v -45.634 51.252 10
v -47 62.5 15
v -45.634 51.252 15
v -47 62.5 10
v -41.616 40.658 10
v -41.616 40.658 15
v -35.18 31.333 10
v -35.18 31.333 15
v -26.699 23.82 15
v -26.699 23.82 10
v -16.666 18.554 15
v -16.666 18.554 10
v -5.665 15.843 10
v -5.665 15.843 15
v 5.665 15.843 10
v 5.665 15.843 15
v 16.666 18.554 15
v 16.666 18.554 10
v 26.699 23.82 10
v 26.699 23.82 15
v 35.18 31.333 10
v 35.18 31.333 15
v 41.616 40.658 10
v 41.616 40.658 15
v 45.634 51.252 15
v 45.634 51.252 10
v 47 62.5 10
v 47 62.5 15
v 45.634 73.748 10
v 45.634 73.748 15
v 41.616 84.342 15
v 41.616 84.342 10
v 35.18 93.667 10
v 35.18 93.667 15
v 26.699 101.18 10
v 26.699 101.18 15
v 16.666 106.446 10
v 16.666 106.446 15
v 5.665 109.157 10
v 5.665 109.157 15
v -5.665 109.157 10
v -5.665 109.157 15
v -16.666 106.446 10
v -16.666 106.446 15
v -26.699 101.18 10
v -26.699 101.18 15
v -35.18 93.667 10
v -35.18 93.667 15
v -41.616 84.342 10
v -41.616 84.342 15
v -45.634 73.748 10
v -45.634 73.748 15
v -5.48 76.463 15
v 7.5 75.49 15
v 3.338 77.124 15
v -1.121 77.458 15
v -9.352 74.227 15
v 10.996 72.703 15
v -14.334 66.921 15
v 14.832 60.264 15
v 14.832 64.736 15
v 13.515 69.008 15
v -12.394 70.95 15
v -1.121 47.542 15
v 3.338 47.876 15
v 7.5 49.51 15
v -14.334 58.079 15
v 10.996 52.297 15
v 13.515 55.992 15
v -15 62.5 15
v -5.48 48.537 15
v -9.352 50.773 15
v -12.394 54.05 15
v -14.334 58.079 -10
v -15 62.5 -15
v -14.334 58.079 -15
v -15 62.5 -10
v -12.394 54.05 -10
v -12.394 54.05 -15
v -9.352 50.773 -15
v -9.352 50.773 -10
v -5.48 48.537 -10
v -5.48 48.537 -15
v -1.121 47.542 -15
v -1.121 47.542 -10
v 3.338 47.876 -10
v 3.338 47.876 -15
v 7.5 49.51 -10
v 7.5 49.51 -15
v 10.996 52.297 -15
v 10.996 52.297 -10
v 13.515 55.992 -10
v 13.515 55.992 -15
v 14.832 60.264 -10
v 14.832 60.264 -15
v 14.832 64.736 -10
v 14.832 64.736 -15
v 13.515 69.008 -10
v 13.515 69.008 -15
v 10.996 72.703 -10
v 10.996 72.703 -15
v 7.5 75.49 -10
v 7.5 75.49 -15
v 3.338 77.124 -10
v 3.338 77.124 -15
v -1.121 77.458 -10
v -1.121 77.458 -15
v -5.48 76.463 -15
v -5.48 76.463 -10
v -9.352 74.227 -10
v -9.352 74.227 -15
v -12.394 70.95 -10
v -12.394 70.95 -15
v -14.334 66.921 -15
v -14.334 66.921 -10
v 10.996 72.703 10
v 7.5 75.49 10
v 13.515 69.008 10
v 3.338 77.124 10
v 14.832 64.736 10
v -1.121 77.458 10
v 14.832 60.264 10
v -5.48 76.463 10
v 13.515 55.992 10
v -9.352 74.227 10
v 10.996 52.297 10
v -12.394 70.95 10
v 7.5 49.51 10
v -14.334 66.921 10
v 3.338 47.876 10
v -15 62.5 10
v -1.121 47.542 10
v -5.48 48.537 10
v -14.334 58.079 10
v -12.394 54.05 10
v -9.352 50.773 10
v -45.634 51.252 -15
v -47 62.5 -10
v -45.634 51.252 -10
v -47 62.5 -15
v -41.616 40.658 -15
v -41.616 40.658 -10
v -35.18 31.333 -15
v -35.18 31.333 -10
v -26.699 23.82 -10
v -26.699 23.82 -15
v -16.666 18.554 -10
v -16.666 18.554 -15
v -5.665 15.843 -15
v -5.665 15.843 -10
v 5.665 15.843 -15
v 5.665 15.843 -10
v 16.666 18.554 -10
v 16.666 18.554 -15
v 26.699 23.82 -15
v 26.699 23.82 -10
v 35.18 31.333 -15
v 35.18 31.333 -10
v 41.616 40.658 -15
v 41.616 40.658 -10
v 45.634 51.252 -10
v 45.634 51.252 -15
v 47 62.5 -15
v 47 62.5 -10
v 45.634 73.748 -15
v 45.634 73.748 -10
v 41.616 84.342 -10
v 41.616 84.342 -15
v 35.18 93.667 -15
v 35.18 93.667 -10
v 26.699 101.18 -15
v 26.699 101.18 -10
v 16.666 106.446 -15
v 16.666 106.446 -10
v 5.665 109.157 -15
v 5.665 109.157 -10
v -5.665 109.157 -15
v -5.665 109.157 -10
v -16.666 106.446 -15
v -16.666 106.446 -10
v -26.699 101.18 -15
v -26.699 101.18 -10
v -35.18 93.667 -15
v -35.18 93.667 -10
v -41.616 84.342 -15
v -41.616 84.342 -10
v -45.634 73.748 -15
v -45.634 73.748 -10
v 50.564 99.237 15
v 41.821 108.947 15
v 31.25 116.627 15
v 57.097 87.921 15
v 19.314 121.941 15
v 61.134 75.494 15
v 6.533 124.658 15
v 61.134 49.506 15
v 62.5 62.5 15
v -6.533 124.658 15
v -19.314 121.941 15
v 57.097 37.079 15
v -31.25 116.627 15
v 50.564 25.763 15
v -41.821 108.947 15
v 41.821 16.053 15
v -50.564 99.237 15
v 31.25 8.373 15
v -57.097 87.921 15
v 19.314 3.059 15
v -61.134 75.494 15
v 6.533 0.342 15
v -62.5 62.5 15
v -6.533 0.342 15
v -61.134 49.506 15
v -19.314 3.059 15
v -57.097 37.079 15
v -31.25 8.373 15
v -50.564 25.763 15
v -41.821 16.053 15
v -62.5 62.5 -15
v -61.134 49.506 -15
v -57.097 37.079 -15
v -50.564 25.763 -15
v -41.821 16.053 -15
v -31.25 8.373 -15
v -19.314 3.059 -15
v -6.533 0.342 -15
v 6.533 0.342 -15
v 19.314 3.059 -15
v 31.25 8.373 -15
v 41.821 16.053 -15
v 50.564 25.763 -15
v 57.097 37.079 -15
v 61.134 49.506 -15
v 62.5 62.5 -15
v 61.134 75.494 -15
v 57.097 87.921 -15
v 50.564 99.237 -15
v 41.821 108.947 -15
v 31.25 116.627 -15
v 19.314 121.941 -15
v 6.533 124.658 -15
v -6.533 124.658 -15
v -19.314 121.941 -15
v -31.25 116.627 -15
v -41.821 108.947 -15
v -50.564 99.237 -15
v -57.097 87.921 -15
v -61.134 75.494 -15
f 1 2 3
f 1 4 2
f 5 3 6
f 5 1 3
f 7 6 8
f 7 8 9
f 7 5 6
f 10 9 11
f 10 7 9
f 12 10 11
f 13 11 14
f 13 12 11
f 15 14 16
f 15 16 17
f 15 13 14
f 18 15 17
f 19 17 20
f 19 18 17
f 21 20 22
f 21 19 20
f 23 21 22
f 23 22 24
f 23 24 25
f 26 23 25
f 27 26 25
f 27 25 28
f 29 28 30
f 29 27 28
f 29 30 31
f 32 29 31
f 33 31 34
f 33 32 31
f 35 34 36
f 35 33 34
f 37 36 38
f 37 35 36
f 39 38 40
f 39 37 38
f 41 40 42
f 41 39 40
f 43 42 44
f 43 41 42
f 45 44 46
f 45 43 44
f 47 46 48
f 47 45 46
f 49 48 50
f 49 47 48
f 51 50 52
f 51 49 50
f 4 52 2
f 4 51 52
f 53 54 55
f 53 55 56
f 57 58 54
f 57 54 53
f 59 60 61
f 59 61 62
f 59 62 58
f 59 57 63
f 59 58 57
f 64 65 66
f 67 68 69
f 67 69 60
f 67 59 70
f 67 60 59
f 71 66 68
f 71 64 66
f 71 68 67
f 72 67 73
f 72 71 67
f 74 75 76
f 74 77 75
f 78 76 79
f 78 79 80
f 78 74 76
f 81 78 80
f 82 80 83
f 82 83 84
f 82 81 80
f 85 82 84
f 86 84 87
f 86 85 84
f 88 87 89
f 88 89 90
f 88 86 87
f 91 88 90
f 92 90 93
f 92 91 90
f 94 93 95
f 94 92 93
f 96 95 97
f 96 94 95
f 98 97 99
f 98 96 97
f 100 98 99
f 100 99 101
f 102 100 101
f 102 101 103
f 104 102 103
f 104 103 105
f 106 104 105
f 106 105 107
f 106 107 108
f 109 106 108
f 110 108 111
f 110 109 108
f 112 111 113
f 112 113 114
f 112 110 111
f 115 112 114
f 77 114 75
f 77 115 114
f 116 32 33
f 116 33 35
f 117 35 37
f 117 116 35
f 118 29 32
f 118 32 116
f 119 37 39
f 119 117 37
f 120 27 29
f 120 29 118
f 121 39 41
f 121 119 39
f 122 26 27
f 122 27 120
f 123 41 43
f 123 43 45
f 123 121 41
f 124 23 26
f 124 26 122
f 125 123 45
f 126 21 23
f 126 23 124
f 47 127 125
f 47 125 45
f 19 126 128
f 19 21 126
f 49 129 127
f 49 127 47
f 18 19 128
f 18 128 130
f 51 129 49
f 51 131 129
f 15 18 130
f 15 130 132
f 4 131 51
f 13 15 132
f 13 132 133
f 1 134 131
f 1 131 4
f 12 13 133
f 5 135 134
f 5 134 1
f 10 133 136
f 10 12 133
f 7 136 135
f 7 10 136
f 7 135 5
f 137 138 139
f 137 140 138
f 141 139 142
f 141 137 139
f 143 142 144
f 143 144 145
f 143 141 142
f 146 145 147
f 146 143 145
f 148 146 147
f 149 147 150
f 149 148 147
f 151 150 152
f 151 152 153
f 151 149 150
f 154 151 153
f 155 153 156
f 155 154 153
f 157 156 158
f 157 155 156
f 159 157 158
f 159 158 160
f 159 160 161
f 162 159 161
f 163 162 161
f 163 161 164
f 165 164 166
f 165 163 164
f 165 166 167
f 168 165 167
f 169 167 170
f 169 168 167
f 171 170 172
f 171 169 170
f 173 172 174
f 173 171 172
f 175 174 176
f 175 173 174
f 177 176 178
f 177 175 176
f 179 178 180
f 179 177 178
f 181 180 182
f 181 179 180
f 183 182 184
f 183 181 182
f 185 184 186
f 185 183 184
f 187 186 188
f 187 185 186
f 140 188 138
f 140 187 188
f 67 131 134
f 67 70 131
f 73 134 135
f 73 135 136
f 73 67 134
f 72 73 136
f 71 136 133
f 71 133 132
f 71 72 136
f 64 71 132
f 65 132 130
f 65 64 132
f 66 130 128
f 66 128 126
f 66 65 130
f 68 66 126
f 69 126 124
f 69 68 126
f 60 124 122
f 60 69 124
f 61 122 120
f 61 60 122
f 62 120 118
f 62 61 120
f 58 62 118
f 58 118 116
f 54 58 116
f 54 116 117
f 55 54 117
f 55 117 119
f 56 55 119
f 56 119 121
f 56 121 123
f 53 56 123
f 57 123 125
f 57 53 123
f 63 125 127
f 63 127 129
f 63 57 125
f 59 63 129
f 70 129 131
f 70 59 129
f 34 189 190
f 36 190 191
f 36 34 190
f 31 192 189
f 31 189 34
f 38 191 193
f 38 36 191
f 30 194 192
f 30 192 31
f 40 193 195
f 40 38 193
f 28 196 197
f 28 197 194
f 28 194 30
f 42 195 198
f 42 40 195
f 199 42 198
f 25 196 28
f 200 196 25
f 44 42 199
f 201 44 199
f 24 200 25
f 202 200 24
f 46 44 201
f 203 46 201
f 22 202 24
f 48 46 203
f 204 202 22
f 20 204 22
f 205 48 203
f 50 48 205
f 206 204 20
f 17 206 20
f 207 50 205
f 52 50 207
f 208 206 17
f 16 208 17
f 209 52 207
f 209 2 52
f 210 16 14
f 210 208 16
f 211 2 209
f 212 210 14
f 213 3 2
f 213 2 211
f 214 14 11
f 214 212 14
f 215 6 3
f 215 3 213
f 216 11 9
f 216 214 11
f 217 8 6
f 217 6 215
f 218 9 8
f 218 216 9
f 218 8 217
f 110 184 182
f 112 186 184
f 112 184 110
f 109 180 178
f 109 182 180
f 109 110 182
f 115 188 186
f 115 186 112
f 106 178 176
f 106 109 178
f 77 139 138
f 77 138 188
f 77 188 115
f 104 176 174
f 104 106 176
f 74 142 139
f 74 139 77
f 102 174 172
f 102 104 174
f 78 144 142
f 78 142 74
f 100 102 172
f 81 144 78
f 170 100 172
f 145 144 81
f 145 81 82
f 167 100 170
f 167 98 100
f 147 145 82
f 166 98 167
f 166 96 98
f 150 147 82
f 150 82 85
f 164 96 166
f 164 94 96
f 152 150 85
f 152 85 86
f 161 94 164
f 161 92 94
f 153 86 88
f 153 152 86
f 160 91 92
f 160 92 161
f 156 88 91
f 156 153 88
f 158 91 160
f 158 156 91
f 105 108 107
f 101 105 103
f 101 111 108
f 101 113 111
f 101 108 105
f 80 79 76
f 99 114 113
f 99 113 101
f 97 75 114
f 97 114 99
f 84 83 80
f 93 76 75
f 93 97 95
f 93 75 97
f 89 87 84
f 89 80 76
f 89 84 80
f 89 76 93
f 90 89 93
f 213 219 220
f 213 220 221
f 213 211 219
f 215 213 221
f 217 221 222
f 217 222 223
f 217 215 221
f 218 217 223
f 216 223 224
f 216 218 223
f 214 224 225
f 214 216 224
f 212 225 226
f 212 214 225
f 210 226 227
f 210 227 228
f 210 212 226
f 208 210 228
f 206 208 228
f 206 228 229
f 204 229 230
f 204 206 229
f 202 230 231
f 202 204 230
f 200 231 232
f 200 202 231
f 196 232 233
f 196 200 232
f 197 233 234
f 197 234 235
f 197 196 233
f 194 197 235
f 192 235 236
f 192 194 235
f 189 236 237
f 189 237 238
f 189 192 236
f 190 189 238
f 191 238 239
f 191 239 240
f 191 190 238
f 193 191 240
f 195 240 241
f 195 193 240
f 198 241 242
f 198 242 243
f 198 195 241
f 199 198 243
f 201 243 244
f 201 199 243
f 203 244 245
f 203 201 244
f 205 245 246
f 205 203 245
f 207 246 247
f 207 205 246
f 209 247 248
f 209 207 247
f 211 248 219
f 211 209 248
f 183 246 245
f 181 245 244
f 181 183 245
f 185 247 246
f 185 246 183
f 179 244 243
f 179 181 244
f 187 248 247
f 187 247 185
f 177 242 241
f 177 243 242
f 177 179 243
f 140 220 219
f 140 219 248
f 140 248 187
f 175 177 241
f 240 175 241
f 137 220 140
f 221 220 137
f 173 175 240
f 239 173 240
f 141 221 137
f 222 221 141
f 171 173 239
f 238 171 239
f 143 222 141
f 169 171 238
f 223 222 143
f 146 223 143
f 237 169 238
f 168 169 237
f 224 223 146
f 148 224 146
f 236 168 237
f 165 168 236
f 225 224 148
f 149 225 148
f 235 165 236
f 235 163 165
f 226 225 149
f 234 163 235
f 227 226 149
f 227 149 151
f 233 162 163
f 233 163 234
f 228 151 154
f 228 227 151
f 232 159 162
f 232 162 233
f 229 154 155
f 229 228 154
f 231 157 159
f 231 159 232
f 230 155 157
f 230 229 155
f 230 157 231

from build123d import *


with BuildPart() as part:
    # SK_P01_Wheel125x30 → P01_Wheel125x30 (revolve)
    with BuildSketch(Plane(origin=(0, 62.5, 0), x_dir=(1, 0, 0), z_dir=(0, 1, 0)), mode=Mode.PRIVATE) as p01_wheel125x30_sk:
        Polygon((0, 15), (15, 15), (15, 10), (47, 10), (47, 15), (62.5, 15), (62.5, -15), (47, -15), (47, -10), (15, -10), (15, -15), (0, -15), align=None)
    revolve(p01_wheel125x30_sk.sketch.rotate(Axis((0, 62.5, -20), (0, 0, 1)), 180), axis=Axis((0, 62.5, -20), (0, 0, 1)))


solid = part.part
